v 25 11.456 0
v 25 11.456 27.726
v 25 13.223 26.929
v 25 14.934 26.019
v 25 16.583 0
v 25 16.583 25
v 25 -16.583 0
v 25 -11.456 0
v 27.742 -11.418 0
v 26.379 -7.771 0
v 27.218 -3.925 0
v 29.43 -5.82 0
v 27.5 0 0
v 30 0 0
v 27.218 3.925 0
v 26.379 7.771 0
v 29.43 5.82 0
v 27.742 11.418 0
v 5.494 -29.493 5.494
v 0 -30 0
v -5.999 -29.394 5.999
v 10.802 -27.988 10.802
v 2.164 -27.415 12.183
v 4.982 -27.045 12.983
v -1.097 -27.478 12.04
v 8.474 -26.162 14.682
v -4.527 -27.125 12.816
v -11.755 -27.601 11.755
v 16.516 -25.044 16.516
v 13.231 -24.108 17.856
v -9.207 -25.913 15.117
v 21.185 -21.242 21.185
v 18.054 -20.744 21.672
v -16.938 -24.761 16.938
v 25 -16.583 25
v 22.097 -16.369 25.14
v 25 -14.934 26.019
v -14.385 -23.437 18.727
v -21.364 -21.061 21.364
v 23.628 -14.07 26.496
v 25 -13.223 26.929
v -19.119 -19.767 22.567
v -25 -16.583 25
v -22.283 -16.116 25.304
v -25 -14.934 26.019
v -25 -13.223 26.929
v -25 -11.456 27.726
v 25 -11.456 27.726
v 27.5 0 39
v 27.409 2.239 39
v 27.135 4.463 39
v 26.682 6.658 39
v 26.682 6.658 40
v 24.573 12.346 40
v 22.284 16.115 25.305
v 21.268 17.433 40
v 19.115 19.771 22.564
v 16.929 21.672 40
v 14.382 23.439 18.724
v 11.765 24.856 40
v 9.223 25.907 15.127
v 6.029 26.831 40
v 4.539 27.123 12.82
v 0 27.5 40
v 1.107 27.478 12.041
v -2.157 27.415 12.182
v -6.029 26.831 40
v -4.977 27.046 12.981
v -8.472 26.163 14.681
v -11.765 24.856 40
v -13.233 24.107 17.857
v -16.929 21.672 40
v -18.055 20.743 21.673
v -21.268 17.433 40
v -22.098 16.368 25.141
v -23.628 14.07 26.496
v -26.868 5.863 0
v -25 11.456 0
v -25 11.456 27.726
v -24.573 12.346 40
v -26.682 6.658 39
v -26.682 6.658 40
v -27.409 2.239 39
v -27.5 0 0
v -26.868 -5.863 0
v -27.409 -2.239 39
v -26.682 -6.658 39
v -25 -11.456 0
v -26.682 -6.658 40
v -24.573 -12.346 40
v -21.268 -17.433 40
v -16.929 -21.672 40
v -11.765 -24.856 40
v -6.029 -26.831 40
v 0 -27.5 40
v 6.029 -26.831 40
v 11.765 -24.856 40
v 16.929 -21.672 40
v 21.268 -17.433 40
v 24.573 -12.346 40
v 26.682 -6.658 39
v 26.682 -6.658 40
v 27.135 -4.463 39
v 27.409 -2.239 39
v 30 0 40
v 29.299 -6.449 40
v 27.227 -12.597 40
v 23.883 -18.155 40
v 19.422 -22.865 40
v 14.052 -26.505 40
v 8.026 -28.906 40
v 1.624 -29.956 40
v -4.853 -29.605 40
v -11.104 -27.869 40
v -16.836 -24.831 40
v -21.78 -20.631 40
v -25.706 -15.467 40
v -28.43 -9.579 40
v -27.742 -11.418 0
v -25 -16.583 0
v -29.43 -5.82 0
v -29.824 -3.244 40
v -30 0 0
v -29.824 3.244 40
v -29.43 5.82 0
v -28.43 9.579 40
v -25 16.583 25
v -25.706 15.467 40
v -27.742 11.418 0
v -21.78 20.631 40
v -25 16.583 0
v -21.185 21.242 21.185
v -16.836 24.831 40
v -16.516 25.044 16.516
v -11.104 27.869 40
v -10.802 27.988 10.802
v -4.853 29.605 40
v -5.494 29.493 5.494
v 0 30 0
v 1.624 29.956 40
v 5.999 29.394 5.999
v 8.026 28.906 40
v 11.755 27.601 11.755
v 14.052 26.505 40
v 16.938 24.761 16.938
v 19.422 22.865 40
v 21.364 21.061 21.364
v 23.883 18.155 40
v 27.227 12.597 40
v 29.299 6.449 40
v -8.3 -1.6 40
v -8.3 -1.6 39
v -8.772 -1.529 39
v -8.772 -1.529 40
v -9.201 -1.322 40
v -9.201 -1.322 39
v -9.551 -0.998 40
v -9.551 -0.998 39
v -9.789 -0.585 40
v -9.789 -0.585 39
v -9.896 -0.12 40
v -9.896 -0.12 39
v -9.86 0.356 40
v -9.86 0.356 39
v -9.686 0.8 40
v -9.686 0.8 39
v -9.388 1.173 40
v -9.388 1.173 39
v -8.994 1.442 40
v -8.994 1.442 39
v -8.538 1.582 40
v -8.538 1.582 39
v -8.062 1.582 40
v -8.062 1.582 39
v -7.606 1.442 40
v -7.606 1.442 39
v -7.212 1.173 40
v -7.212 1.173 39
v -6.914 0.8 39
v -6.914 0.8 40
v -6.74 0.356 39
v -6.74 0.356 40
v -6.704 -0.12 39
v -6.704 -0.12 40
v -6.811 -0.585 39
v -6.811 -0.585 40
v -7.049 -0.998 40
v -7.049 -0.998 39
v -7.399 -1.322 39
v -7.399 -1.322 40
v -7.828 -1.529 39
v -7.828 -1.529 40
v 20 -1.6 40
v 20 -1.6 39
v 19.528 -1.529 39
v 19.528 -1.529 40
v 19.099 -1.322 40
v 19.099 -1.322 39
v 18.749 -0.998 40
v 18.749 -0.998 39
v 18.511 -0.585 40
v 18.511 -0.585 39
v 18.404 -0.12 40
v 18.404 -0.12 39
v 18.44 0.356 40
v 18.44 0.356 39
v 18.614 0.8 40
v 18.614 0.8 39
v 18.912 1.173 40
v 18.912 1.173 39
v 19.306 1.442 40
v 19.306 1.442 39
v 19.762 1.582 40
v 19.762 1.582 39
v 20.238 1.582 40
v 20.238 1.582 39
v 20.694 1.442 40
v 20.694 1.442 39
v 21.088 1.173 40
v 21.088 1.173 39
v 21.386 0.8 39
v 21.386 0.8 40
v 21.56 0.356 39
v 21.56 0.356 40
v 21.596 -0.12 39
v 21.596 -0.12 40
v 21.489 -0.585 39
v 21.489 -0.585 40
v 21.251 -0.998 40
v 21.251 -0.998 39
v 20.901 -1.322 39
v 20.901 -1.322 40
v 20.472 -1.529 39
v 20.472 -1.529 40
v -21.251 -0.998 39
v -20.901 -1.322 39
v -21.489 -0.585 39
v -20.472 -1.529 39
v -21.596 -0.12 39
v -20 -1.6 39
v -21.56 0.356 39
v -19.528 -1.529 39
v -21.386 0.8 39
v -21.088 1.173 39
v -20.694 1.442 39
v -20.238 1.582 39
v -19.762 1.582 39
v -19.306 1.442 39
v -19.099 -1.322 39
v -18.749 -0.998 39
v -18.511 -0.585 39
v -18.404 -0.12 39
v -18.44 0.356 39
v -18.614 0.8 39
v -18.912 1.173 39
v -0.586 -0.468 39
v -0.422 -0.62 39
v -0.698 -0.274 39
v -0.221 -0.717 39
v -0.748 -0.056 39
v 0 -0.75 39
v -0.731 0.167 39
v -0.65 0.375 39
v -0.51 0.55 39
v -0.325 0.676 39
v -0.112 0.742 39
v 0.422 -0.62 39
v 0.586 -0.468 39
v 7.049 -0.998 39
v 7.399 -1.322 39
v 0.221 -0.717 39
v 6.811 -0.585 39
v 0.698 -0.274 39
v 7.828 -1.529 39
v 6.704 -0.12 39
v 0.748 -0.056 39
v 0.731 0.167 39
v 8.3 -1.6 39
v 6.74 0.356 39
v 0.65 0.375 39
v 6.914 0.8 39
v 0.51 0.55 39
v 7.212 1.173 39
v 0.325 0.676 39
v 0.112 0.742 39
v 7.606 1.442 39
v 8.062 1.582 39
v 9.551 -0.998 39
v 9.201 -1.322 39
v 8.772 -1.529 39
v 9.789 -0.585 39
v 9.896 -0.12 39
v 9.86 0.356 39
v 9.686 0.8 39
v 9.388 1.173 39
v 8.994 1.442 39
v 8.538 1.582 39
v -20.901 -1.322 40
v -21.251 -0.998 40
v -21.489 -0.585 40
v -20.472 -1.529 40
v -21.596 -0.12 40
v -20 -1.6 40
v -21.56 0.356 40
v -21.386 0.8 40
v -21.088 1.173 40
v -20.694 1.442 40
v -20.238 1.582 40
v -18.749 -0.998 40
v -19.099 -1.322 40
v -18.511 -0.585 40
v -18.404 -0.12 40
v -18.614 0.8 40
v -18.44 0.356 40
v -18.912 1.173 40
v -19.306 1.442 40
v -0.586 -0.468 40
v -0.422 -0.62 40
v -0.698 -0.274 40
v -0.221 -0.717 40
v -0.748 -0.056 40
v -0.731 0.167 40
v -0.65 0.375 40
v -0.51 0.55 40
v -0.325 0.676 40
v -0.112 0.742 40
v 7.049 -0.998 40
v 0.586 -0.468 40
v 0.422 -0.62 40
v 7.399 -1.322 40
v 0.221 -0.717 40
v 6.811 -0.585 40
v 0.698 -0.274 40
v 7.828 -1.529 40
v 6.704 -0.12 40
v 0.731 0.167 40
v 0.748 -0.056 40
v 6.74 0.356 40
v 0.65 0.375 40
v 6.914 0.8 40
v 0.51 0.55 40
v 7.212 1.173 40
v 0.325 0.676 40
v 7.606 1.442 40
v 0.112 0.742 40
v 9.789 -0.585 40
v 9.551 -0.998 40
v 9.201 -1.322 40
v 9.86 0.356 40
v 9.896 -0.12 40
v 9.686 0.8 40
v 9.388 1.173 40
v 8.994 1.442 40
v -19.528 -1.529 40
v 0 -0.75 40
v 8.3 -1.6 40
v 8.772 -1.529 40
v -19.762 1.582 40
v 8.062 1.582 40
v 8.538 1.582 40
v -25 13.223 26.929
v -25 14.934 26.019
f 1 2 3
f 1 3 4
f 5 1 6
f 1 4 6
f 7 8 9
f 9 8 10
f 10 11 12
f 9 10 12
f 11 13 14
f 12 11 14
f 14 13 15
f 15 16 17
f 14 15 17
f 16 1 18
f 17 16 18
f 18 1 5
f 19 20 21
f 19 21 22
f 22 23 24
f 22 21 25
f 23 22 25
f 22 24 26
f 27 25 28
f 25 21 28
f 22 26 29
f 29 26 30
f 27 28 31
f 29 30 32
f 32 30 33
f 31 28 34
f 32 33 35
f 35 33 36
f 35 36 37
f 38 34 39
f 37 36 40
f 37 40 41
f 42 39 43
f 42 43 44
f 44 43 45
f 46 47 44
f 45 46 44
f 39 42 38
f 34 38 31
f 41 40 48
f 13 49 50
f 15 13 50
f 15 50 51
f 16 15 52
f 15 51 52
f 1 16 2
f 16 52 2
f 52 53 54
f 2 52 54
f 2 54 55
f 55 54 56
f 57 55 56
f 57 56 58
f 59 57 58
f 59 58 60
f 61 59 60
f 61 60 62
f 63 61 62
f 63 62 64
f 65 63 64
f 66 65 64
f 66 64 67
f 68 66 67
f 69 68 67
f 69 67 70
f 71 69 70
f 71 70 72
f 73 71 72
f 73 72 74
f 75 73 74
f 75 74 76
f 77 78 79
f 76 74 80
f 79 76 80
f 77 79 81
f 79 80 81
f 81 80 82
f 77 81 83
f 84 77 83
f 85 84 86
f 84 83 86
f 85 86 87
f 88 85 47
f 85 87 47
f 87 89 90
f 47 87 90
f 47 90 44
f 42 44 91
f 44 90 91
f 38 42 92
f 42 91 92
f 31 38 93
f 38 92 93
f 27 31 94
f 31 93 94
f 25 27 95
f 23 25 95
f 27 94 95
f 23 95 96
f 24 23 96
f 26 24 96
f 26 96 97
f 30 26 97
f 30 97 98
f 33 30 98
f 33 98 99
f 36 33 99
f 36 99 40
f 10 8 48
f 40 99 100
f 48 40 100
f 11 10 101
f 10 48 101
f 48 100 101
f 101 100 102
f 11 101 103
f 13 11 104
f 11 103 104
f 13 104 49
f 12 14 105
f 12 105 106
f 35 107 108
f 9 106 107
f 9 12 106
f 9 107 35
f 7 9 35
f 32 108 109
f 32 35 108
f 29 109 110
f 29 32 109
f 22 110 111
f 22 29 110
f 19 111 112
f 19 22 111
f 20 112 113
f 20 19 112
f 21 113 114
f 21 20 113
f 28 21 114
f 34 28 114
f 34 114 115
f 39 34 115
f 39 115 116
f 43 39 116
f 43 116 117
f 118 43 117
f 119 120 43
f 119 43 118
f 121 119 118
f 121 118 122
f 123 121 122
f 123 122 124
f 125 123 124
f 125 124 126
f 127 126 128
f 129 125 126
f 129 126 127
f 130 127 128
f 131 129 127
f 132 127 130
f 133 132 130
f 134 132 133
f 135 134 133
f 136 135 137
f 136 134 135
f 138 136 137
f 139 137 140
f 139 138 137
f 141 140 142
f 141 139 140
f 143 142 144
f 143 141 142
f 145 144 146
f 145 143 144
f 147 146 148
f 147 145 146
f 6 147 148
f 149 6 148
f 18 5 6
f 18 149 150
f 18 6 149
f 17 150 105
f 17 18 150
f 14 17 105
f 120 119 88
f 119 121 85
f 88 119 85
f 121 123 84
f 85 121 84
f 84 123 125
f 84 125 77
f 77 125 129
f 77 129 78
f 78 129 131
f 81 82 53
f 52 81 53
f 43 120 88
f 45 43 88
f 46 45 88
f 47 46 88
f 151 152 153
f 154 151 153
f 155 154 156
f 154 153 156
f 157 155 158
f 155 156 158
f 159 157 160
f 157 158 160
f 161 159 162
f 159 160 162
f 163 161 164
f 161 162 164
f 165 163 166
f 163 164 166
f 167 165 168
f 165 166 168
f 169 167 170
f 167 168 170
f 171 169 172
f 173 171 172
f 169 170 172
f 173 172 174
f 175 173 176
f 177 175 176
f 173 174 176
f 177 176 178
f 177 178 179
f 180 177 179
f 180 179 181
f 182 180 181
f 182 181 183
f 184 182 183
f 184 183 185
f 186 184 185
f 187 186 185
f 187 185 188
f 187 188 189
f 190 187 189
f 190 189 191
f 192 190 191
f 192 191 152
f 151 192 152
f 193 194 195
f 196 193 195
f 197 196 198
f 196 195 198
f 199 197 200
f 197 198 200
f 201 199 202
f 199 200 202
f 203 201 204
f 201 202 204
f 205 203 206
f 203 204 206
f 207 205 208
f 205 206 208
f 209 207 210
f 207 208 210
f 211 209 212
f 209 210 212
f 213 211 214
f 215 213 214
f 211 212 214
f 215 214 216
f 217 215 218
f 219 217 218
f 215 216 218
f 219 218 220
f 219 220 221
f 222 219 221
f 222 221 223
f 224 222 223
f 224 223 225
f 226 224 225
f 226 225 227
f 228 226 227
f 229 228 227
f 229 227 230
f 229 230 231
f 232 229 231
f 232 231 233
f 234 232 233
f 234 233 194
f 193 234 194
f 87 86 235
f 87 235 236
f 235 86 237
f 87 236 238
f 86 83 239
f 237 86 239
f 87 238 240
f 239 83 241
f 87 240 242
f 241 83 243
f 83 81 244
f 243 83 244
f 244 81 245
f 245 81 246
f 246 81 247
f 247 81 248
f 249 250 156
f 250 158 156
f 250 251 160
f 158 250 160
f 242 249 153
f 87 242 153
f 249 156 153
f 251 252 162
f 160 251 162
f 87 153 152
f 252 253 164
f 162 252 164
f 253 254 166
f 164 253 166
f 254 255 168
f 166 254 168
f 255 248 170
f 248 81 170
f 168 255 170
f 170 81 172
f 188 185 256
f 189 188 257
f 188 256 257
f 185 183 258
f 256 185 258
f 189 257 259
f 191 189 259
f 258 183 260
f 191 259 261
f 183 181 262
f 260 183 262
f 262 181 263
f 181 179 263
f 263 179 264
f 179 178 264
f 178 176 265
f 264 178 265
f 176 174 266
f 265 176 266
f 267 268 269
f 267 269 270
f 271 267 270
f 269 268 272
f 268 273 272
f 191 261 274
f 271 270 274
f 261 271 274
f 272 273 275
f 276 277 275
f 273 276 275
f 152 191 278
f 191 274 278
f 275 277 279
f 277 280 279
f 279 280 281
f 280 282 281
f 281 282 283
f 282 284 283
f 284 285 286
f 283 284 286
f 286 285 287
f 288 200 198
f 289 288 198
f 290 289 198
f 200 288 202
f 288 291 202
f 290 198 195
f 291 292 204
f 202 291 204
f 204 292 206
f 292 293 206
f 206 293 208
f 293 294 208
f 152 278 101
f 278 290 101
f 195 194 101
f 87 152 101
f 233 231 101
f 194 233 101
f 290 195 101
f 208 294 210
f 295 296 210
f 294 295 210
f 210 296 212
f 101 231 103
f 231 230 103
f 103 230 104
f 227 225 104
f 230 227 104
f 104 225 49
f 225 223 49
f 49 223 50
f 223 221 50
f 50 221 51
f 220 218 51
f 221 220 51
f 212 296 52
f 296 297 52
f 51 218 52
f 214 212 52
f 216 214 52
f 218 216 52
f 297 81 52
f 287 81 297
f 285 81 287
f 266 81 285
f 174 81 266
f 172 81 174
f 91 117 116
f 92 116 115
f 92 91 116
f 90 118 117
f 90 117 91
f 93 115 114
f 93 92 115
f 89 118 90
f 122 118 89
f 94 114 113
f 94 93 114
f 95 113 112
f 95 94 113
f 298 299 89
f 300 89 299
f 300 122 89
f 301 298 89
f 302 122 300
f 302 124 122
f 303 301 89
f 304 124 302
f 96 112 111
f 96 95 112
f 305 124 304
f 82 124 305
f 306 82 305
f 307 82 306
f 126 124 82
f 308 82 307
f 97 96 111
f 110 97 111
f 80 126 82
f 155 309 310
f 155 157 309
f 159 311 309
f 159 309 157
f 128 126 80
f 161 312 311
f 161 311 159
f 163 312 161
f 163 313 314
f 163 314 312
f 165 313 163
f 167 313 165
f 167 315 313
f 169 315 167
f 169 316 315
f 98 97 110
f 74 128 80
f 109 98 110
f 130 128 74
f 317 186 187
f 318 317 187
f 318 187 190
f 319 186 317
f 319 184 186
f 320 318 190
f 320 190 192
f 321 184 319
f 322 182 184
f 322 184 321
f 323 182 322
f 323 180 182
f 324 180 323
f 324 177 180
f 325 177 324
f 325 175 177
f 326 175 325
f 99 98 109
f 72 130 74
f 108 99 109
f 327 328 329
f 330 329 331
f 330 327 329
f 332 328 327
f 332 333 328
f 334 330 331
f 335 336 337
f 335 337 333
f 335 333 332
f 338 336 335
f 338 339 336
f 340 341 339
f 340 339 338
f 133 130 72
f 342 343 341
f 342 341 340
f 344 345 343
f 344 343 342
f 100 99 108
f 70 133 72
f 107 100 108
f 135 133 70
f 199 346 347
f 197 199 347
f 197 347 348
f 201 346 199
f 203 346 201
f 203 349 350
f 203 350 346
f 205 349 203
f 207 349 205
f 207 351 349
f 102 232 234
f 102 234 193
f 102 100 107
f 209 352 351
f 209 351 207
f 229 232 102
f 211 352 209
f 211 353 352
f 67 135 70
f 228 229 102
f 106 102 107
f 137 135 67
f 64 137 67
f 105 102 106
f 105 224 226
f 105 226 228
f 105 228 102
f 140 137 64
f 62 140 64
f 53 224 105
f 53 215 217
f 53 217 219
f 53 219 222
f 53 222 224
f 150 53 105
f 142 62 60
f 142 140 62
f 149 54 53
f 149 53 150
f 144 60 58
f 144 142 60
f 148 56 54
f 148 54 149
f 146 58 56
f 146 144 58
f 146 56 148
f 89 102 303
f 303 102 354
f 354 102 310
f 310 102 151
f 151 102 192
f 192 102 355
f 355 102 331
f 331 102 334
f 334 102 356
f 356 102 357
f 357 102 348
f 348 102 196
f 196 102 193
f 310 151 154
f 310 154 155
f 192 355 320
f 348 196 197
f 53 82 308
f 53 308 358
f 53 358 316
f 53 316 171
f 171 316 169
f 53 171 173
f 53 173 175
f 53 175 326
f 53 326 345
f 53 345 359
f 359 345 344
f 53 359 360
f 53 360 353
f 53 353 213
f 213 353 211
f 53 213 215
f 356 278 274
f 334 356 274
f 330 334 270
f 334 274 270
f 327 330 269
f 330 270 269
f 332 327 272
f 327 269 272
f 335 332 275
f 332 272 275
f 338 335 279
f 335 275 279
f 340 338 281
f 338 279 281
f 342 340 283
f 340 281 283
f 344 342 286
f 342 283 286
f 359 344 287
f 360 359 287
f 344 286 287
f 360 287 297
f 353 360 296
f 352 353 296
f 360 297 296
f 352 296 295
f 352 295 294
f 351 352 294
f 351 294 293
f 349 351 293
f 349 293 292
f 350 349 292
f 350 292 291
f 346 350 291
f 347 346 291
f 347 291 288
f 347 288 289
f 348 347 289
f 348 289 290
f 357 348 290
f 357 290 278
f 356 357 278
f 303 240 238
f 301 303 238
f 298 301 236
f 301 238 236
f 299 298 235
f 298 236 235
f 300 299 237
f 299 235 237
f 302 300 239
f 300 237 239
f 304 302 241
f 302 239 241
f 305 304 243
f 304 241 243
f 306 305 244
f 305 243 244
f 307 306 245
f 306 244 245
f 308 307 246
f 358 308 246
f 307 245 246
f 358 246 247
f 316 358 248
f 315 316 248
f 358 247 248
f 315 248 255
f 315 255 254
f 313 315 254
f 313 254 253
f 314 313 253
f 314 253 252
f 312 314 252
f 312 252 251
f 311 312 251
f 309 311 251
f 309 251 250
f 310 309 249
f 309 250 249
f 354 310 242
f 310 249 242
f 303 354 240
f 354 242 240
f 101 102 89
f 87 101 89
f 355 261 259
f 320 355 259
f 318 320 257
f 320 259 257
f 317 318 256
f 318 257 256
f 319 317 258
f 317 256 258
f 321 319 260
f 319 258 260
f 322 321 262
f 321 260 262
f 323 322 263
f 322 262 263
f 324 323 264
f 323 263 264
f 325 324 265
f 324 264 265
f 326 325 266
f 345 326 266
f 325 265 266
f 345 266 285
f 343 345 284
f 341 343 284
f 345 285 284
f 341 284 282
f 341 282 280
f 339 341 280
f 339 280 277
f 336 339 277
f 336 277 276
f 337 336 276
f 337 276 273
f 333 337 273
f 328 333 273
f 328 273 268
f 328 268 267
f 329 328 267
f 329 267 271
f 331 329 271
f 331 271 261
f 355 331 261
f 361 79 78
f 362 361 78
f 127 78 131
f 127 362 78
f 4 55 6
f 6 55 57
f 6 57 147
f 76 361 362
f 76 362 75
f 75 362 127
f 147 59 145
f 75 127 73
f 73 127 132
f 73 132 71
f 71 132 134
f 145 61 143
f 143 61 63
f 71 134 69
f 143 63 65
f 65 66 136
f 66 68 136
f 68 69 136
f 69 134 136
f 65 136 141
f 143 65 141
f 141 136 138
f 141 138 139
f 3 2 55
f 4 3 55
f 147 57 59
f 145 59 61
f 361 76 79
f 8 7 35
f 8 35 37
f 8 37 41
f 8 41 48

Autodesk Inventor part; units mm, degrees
ref_plane "YZ Plane" through (0, 0, 0) normal (1, 0, 0) x (0, 1, 0)
ref_plane "XZ Plane" through (0, 0, 0) normal (0, 1, 0) x (-1, 0, 0)
ref_plane "XY Plane" through (0, 0, 0) normal (0, 0, 1) x (1, 0, 0)
sketch "スケッチ1" plane through (0, 0, 0) normal (0, 0, 1) x (1, 0, 0)
  circle A0 centre (0, 0) radius 30
  dimension "d0" = 60
extrude "押し出し1" add sketch "スケッチ1" along normal blind 40
sketch "スケッチ2" plane through (0, 0, 40) normal (0, 0, 1) x (1, 0, 0)
  circle A0 centre (0, 0) radius 27.5
  dimension "d3" = 55
extrude "押し出し2" cut sketch "スケッチ2" against normal blind 50
sketch "スケッチ3" plane through (0, 0, 0) normal (0, 0, 1) x (1, 0, 0)
  point P0 (0, 0)
sketch "スケッチ4" plane through (0, 0, 0) normal (1, 0, 0) x (0, 1, 0)
  line L0 (30, 0) -> (-30, 0) projected
  line L1 (-30, 0) -> (-30, 40) projected
  arc A0 (30, 0) -> (-30, 0) centre (0, 0) ccw
  dimension "d6" = 30
extrude "押し出し3" cut sketch "スケッチ4" along normal mid plane 50
sketch "スケッチ5" plane through (0, 0, 40) normal (0, 0, 1) x (1, 0, 0)
  circle A0 centre (0, 0) radius 27.5
extrude "押し出し4" add sketch "スケッチ5" against normal blind 1
sketch "スケッチ19" plane through (0, 0, 40) normal (0, 0, 1) x (1, 0, 0)
  circle A0 centre (0, 0) radius 27.5
  line L0 (27.5, -6.6575) -> (-27.5, -6.6575)
  line L1 (-27.5, -6.6575) -> (-27.5, 6.6575)
  line L2 (-27.5, 6.6575) -> (27.5, 6.6575)
  line L3 (27.5, 6.6575) -> (27.5, -6.6575)
  line L4 (27.5, -6.6575) -> (-27.5, 6.6575) construction
  line L5 (-27.5, -6.6575) -> (27.5, 6.6575) construction
  point P0 (26.682, -6.6575)
  point P1 (-26.682, -6.6575)
  point P2 (-26.682, 6.6575)
  point P3 (26.682, 6.6575)
extrude "押し出し11" cut sketch "スケッチ19" against normal blind 10 contours L2 A0 | A0 L0
sketch "スケッチ22" plane through (0, 0, 40) normal (0, 0, 1) x (1, 0, 0)
  point P0 (0, 0)
sketch "スケッチ23" plane through (0, 0, 40) normal (0, 0, 1) x (1, 0, 0)
  point P0 (0, 0)
  point P1 (-20, 0)
  point P2 (20, 0)
  dimension "d67" = 20
  dimension "d68" = 20
hole "穴4" at (-20, 0, 40) at (20, 0, 40) direction (0, 0, -1) diameter 3.2 depth 8.8 tip angle 118
sketch "スケッチ25" plane through (0, 0, 40) normal (0, 0, 1) x (1, 0, 0)
  point P0 (0, 0)
  point P1 (0, 0)
hole "穴5" at (0, 0, 40) direction (0, 0, -1) diameter 1.5 depth 8.8 tip angle 118
sketch "スケッチ26" plane through (0, 0, 40) normal (0, 0, 1) x (1, 0, 0)
  point P0 (0, 0)
  point P1 (-8.3, 0)
  point P2 (8.3, 0)
  dimension "d86" = 8.3
  dimension "d87" = 8.3
hole "穴6" at (-8.3, 0, 40) at (8.3, 0, 40) direction (0, 0, -1) diameter 3.2 depth 8.8 tip angle 118
properties part number "20220527_仮筒"
